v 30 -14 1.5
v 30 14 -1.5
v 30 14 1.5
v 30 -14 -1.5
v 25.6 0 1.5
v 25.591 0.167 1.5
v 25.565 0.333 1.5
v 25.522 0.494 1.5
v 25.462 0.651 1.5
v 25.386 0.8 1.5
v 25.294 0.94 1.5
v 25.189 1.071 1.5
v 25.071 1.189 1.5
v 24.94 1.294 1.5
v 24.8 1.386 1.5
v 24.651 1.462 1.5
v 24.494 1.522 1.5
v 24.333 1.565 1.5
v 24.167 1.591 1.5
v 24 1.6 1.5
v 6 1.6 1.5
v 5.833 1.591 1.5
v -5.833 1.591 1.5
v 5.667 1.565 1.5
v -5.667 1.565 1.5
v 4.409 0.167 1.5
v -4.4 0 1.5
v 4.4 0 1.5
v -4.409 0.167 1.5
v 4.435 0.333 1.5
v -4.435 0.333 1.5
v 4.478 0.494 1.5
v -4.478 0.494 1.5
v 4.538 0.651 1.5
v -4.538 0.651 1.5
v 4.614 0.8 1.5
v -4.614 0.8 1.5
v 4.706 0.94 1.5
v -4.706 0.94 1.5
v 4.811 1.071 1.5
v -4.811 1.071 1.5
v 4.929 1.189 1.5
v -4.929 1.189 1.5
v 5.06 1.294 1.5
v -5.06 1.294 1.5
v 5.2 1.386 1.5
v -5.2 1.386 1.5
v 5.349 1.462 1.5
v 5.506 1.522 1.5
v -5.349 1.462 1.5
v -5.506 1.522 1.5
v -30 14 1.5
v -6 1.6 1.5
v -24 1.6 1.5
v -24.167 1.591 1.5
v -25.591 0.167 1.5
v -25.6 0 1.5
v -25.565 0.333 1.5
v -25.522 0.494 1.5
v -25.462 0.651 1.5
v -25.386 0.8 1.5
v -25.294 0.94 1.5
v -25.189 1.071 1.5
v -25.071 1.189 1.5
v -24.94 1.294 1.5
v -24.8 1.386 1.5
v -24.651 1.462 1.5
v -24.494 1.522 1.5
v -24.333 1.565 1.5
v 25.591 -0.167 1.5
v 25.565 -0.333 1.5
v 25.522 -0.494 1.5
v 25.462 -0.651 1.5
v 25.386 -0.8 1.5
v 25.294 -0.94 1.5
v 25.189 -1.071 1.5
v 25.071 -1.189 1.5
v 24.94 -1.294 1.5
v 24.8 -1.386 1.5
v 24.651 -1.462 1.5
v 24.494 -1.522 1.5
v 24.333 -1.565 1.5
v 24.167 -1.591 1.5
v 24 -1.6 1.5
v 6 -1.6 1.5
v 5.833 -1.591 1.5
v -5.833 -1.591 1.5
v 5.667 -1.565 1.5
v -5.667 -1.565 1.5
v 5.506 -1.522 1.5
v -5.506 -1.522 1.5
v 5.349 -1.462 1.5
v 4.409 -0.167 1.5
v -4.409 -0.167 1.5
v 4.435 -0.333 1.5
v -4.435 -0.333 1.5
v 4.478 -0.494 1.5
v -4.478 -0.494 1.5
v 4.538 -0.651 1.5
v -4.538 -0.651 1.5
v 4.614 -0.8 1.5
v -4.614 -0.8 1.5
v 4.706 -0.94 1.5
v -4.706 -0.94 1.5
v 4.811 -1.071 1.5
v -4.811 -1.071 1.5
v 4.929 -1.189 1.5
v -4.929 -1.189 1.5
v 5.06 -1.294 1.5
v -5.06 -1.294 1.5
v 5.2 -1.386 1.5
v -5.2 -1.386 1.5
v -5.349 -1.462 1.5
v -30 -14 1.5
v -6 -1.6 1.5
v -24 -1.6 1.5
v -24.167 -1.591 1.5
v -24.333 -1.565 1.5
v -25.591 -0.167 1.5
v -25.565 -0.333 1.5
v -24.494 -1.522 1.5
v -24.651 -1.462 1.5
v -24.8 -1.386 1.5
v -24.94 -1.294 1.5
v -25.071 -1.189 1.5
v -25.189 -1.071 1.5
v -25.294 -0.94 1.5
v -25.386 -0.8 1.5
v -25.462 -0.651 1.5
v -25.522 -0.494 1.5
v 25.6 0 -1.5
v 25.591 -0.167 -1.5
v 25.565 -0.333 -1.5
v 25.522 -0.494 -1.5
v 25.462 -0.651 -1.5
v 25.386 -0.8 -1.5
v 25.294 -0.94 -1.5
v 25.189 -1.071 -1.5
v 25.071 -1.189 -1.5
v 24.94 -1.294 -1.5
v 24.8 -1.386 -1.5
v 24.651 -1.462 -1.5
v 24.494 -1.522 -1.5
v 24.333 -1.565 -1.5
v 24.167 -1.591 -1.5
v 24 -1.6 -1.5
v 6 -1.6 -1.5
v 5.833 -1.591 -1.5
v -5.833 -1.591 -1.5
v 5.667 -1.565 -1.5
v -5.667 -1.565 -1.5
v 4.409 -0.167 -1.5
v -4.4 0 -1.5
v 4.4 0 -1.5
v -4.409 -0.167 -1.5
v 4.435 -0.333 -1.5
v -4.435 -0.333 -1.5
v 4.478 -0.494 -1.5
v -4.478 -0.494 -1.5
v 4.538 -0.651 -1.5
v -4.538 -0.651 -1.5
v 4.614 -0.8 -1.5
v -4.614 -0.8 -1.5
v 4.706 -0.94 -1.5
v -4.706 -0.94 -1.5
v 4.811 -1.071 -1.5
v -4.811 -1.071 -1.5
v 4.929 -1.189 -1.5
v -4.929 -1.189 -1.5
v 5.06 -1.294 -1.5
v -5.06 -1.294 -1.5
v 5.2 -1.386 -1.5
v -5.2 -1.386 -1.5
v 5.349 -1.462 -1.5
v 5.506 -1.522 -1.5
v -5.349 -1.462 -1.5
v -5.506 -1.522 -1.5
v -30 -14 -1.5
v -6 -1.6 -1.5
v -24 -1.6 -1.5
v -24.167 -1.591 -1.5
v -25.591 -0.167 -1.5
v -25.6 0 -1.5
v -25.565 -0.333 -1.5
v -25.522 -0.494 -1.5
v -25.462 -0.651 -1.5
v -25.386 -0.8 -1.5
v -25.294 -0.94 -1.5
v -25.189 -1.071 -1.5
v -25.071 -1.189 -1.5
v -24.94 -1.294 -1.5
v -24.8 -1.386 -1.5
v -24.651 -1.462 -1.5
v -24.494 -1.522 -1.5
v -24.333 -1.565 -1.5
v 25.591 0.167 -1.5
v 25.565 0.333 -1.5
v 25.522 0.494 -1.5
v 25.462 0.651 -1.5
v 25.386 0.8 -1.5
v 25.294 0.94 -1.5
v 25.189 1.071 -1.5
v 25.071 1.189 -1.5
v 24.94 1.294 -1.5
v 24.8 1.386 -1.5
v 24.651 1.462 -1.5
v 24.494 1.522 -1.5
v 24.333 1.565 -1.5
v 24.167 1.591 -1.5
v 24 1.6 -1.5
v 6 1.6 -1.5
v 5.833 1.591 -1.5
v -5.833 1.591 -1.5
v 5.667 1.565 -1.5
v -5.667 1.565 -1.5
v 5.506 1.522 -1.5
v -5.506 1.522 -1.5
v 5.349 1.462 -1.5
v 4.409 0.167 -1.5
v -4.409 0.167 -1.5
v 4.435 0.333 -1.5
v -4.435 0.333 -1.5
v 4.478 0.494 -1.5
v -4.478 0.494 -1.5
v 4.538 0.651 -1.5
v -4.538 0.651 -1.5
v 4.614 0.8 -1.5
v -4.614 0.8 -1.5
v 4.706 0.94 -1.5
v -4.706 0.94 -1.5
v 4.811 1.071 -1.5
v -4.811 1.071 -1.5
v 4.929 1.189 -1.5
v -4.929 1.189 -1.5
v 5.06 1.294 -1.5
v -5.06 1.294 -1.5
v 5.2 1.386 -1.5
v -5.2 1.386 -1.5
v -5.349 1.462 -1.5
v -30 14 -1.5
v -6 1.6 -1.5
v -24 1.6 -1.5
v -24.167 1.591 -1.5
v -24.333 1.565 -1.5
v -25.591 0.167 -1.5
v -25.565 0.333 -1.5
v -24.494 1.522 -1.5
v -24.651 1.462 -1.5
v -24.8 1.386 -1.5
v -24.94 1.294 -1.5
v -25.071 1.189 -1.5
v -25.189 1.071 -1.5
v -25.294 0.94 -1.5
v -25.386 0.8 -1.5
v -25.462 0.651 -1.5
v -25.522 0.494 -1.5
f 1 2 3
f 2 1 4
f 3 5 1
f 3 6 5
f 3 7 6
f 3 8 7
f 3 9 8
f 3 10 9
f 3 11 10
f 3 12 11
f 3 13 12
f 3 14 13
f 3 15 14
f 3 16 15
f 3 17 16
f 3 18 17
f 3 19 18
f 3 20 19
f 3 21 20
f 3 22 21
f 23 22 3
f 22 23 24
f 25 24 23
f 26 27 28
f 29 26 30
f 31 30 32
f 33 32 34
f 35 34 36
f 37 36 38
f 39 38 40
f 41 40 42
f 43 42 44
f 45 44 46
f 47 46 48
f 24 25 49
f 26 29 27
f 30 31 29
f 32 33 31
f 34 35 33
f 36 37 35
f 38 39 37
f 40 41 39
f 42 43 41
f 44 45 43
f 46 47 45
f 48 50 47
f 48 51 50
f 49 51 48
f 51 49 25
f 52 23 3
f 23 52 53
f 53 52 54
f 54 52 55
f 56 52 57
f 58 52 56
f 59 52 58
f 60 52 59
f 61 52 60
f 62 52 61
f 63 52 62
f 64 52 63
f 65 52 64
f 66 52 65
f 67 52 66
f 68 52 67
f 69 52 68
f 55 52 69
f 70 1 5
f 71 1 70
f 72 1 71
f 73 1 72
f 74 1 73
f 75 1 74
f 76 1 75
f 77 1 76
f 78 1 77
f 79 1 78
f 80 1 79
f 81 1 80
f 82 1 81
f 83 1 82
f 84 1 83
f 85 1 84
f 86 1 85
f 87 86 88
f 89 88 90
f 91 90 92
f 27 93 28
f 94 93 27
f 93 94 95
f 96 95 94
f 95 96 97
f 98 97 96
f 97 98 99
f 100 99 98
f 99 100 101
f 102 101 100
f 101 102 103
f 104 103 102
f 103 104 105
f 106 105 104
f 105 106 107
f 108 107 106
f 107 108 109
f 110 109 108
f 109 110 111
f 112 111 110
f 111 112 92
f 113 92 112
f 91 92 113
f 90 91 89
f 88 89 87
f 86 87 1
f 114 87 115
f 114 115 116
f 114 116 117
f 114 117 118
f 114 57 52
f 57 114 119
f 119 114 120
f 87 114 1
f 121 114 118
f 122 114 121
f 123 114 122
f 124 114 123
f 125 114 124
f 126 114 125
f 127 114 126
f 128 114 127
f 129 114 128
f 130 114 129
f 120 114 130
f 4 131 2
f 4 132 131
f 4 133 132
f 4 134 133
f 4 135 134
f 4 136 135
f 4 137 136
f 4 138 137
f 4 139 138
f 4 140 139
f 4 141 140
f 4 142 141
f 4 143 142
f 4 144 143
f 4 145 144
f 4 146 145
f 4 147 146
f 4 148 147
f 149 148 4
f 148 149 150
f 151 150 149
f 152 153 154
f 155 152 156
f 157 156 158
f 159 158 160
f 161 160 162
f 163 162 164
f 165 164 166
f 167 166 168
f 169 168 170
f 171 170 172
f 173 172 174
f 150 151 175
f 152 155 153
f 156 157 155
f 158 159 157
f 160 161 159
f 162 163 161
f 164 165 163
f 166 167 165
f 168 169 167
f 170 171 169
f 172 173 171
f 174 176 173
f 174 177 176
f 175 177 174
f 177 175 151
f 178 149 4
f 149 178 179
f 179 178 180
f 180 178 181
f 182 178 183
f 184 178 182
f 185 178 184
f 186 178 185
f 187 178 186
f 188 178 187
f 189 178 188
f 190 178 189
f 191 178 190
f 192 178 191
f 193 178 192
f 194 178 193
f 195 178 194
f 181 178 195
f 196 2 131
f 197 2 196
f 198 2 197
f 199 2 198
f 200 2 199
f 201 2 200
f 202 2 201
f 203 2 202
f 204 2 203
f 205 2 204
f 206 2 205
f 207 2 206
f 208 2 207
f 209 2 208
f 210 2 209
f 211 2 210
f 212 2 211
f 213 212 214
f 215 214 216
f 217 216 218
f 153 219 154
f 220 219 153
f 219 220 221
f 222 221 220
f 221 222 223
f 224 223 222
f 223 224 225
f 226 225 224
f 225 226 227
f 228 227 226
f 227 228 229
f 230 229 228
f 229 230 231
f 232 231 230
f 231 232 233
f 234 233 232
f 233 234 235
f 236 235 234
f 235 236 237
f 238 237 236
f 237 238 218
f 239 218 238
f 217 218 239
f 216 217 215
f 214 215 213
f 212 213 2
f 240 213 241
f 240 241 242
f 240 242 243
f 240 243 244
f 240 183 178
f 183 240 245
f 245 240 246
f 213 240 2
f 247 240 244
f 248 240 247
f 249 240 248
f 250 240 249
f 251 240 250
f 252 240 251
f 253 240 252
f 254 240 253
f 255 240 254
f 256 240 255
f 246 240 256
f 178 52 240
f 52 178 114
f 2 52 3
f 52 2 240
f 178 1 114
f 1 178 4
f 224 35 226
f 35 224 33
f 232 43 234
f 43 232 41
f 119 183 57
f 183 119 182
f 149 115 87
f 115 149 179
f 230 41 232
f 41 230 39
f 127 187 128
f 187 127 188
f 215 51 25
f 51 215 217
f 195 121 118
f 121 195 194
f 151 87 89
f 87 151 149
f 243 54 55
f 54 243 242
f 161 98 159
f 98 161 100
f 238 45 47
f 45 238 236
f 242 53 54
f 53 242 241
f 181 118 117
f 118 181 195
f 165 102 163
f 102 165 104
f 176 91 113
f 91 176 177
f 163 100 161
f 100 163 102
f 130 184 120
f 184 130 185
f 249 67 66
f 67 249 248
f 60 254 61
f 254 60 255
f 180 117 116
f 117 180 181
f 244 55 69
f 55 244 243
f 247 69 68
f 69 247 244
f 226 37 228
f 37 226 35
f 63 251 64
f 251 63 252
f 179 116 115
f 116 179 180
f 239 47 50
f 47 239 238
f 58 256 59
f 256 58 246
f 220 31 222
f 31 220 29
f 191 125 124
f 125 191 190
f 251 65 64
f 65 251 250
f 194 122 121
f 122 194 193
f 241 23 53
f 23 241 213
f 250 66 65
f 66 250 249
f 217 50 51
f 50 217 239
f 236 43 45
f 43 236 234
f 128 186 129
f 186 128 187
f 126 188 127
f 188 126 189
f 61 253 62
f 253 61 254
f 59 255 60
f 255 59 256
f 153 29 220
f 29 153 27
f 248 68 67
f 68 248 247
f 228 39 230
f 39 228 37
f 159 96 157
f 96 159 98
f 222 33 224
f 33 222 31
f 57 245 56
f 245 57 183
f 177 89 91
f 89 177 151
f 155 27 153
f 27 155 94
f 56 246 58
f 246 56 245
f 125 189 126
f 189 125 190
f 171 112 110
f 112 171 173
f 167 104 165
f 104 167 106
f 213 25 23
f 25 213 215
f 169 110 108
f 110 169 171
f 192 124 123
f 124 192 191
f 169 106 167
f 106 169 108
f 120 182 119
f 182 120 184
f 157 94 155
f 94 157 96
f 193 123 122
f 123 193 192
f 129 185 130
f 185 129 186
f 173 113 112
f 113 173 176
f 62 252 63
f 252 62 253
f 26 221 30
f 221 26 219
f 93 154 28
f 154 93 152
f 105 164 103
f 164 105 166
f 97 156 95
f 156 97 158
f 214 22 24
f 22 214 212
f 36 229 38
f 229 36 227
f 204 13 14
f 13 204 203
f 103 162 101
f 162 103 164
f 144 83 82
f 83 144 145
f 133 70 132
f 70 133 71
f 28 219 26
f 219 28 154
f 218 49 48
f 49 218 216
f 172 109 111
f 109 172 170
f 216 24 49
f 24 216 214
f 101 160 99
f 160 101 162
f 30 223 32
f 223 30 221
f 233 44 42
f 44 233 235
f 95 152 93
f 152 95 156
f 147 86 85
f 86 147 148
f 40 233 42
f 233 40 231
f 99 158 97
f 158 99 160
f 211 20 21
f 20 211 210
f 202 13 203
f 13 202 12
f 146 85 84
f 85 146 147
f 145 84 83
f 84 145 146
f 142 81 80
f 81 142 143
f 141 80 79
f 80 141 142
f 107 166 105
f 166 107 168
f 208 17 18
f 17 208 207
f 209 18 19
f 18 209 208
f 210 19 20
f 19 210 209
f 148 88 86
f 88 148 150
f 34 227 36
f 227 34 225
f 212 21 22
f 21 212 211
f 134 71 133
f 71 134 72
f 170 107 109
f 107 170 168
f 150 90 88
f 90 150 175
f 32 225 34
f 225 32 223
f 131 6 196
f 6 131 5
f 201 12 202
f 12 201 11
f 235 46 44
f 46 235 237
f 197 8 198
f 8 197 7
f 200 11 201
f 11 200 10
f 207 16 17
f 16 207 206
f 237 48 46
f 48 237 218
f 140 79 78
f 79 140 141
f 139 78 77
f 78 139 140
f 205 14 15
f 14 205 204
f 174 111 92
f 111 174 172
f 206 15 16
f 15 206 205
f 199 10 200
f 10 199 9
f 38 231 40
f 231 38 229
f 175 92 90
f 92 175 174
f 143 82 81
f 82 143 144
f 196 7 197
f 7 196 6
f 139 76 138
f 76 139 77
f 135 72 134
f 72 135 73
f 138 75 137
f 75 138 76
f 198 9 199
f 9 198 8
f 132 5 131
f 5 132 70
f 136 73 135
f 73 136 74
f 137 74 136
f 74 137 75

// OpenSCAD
// Limit-switch mounting plate.
$fn = 60;
eps = 0.02;
plate_l = 60;
plate_w = 28;
plate_t = 3;
slot_l = 18;
module slot(x) { hull() { translate([x-slot_l/2,0,-plate_t/2-eps]) cylinder(d=3.2,h=plate_t+2*eps); translate([x+slot_l/2,0,-plate_t/2-eps]) cylinder(d=3.2,h=plate_t+2*eps); } }
difference() { cube([plate_l,plate_w,plate_t],center=true); slot(-plate_l/4); slot(plate_l/4); }
